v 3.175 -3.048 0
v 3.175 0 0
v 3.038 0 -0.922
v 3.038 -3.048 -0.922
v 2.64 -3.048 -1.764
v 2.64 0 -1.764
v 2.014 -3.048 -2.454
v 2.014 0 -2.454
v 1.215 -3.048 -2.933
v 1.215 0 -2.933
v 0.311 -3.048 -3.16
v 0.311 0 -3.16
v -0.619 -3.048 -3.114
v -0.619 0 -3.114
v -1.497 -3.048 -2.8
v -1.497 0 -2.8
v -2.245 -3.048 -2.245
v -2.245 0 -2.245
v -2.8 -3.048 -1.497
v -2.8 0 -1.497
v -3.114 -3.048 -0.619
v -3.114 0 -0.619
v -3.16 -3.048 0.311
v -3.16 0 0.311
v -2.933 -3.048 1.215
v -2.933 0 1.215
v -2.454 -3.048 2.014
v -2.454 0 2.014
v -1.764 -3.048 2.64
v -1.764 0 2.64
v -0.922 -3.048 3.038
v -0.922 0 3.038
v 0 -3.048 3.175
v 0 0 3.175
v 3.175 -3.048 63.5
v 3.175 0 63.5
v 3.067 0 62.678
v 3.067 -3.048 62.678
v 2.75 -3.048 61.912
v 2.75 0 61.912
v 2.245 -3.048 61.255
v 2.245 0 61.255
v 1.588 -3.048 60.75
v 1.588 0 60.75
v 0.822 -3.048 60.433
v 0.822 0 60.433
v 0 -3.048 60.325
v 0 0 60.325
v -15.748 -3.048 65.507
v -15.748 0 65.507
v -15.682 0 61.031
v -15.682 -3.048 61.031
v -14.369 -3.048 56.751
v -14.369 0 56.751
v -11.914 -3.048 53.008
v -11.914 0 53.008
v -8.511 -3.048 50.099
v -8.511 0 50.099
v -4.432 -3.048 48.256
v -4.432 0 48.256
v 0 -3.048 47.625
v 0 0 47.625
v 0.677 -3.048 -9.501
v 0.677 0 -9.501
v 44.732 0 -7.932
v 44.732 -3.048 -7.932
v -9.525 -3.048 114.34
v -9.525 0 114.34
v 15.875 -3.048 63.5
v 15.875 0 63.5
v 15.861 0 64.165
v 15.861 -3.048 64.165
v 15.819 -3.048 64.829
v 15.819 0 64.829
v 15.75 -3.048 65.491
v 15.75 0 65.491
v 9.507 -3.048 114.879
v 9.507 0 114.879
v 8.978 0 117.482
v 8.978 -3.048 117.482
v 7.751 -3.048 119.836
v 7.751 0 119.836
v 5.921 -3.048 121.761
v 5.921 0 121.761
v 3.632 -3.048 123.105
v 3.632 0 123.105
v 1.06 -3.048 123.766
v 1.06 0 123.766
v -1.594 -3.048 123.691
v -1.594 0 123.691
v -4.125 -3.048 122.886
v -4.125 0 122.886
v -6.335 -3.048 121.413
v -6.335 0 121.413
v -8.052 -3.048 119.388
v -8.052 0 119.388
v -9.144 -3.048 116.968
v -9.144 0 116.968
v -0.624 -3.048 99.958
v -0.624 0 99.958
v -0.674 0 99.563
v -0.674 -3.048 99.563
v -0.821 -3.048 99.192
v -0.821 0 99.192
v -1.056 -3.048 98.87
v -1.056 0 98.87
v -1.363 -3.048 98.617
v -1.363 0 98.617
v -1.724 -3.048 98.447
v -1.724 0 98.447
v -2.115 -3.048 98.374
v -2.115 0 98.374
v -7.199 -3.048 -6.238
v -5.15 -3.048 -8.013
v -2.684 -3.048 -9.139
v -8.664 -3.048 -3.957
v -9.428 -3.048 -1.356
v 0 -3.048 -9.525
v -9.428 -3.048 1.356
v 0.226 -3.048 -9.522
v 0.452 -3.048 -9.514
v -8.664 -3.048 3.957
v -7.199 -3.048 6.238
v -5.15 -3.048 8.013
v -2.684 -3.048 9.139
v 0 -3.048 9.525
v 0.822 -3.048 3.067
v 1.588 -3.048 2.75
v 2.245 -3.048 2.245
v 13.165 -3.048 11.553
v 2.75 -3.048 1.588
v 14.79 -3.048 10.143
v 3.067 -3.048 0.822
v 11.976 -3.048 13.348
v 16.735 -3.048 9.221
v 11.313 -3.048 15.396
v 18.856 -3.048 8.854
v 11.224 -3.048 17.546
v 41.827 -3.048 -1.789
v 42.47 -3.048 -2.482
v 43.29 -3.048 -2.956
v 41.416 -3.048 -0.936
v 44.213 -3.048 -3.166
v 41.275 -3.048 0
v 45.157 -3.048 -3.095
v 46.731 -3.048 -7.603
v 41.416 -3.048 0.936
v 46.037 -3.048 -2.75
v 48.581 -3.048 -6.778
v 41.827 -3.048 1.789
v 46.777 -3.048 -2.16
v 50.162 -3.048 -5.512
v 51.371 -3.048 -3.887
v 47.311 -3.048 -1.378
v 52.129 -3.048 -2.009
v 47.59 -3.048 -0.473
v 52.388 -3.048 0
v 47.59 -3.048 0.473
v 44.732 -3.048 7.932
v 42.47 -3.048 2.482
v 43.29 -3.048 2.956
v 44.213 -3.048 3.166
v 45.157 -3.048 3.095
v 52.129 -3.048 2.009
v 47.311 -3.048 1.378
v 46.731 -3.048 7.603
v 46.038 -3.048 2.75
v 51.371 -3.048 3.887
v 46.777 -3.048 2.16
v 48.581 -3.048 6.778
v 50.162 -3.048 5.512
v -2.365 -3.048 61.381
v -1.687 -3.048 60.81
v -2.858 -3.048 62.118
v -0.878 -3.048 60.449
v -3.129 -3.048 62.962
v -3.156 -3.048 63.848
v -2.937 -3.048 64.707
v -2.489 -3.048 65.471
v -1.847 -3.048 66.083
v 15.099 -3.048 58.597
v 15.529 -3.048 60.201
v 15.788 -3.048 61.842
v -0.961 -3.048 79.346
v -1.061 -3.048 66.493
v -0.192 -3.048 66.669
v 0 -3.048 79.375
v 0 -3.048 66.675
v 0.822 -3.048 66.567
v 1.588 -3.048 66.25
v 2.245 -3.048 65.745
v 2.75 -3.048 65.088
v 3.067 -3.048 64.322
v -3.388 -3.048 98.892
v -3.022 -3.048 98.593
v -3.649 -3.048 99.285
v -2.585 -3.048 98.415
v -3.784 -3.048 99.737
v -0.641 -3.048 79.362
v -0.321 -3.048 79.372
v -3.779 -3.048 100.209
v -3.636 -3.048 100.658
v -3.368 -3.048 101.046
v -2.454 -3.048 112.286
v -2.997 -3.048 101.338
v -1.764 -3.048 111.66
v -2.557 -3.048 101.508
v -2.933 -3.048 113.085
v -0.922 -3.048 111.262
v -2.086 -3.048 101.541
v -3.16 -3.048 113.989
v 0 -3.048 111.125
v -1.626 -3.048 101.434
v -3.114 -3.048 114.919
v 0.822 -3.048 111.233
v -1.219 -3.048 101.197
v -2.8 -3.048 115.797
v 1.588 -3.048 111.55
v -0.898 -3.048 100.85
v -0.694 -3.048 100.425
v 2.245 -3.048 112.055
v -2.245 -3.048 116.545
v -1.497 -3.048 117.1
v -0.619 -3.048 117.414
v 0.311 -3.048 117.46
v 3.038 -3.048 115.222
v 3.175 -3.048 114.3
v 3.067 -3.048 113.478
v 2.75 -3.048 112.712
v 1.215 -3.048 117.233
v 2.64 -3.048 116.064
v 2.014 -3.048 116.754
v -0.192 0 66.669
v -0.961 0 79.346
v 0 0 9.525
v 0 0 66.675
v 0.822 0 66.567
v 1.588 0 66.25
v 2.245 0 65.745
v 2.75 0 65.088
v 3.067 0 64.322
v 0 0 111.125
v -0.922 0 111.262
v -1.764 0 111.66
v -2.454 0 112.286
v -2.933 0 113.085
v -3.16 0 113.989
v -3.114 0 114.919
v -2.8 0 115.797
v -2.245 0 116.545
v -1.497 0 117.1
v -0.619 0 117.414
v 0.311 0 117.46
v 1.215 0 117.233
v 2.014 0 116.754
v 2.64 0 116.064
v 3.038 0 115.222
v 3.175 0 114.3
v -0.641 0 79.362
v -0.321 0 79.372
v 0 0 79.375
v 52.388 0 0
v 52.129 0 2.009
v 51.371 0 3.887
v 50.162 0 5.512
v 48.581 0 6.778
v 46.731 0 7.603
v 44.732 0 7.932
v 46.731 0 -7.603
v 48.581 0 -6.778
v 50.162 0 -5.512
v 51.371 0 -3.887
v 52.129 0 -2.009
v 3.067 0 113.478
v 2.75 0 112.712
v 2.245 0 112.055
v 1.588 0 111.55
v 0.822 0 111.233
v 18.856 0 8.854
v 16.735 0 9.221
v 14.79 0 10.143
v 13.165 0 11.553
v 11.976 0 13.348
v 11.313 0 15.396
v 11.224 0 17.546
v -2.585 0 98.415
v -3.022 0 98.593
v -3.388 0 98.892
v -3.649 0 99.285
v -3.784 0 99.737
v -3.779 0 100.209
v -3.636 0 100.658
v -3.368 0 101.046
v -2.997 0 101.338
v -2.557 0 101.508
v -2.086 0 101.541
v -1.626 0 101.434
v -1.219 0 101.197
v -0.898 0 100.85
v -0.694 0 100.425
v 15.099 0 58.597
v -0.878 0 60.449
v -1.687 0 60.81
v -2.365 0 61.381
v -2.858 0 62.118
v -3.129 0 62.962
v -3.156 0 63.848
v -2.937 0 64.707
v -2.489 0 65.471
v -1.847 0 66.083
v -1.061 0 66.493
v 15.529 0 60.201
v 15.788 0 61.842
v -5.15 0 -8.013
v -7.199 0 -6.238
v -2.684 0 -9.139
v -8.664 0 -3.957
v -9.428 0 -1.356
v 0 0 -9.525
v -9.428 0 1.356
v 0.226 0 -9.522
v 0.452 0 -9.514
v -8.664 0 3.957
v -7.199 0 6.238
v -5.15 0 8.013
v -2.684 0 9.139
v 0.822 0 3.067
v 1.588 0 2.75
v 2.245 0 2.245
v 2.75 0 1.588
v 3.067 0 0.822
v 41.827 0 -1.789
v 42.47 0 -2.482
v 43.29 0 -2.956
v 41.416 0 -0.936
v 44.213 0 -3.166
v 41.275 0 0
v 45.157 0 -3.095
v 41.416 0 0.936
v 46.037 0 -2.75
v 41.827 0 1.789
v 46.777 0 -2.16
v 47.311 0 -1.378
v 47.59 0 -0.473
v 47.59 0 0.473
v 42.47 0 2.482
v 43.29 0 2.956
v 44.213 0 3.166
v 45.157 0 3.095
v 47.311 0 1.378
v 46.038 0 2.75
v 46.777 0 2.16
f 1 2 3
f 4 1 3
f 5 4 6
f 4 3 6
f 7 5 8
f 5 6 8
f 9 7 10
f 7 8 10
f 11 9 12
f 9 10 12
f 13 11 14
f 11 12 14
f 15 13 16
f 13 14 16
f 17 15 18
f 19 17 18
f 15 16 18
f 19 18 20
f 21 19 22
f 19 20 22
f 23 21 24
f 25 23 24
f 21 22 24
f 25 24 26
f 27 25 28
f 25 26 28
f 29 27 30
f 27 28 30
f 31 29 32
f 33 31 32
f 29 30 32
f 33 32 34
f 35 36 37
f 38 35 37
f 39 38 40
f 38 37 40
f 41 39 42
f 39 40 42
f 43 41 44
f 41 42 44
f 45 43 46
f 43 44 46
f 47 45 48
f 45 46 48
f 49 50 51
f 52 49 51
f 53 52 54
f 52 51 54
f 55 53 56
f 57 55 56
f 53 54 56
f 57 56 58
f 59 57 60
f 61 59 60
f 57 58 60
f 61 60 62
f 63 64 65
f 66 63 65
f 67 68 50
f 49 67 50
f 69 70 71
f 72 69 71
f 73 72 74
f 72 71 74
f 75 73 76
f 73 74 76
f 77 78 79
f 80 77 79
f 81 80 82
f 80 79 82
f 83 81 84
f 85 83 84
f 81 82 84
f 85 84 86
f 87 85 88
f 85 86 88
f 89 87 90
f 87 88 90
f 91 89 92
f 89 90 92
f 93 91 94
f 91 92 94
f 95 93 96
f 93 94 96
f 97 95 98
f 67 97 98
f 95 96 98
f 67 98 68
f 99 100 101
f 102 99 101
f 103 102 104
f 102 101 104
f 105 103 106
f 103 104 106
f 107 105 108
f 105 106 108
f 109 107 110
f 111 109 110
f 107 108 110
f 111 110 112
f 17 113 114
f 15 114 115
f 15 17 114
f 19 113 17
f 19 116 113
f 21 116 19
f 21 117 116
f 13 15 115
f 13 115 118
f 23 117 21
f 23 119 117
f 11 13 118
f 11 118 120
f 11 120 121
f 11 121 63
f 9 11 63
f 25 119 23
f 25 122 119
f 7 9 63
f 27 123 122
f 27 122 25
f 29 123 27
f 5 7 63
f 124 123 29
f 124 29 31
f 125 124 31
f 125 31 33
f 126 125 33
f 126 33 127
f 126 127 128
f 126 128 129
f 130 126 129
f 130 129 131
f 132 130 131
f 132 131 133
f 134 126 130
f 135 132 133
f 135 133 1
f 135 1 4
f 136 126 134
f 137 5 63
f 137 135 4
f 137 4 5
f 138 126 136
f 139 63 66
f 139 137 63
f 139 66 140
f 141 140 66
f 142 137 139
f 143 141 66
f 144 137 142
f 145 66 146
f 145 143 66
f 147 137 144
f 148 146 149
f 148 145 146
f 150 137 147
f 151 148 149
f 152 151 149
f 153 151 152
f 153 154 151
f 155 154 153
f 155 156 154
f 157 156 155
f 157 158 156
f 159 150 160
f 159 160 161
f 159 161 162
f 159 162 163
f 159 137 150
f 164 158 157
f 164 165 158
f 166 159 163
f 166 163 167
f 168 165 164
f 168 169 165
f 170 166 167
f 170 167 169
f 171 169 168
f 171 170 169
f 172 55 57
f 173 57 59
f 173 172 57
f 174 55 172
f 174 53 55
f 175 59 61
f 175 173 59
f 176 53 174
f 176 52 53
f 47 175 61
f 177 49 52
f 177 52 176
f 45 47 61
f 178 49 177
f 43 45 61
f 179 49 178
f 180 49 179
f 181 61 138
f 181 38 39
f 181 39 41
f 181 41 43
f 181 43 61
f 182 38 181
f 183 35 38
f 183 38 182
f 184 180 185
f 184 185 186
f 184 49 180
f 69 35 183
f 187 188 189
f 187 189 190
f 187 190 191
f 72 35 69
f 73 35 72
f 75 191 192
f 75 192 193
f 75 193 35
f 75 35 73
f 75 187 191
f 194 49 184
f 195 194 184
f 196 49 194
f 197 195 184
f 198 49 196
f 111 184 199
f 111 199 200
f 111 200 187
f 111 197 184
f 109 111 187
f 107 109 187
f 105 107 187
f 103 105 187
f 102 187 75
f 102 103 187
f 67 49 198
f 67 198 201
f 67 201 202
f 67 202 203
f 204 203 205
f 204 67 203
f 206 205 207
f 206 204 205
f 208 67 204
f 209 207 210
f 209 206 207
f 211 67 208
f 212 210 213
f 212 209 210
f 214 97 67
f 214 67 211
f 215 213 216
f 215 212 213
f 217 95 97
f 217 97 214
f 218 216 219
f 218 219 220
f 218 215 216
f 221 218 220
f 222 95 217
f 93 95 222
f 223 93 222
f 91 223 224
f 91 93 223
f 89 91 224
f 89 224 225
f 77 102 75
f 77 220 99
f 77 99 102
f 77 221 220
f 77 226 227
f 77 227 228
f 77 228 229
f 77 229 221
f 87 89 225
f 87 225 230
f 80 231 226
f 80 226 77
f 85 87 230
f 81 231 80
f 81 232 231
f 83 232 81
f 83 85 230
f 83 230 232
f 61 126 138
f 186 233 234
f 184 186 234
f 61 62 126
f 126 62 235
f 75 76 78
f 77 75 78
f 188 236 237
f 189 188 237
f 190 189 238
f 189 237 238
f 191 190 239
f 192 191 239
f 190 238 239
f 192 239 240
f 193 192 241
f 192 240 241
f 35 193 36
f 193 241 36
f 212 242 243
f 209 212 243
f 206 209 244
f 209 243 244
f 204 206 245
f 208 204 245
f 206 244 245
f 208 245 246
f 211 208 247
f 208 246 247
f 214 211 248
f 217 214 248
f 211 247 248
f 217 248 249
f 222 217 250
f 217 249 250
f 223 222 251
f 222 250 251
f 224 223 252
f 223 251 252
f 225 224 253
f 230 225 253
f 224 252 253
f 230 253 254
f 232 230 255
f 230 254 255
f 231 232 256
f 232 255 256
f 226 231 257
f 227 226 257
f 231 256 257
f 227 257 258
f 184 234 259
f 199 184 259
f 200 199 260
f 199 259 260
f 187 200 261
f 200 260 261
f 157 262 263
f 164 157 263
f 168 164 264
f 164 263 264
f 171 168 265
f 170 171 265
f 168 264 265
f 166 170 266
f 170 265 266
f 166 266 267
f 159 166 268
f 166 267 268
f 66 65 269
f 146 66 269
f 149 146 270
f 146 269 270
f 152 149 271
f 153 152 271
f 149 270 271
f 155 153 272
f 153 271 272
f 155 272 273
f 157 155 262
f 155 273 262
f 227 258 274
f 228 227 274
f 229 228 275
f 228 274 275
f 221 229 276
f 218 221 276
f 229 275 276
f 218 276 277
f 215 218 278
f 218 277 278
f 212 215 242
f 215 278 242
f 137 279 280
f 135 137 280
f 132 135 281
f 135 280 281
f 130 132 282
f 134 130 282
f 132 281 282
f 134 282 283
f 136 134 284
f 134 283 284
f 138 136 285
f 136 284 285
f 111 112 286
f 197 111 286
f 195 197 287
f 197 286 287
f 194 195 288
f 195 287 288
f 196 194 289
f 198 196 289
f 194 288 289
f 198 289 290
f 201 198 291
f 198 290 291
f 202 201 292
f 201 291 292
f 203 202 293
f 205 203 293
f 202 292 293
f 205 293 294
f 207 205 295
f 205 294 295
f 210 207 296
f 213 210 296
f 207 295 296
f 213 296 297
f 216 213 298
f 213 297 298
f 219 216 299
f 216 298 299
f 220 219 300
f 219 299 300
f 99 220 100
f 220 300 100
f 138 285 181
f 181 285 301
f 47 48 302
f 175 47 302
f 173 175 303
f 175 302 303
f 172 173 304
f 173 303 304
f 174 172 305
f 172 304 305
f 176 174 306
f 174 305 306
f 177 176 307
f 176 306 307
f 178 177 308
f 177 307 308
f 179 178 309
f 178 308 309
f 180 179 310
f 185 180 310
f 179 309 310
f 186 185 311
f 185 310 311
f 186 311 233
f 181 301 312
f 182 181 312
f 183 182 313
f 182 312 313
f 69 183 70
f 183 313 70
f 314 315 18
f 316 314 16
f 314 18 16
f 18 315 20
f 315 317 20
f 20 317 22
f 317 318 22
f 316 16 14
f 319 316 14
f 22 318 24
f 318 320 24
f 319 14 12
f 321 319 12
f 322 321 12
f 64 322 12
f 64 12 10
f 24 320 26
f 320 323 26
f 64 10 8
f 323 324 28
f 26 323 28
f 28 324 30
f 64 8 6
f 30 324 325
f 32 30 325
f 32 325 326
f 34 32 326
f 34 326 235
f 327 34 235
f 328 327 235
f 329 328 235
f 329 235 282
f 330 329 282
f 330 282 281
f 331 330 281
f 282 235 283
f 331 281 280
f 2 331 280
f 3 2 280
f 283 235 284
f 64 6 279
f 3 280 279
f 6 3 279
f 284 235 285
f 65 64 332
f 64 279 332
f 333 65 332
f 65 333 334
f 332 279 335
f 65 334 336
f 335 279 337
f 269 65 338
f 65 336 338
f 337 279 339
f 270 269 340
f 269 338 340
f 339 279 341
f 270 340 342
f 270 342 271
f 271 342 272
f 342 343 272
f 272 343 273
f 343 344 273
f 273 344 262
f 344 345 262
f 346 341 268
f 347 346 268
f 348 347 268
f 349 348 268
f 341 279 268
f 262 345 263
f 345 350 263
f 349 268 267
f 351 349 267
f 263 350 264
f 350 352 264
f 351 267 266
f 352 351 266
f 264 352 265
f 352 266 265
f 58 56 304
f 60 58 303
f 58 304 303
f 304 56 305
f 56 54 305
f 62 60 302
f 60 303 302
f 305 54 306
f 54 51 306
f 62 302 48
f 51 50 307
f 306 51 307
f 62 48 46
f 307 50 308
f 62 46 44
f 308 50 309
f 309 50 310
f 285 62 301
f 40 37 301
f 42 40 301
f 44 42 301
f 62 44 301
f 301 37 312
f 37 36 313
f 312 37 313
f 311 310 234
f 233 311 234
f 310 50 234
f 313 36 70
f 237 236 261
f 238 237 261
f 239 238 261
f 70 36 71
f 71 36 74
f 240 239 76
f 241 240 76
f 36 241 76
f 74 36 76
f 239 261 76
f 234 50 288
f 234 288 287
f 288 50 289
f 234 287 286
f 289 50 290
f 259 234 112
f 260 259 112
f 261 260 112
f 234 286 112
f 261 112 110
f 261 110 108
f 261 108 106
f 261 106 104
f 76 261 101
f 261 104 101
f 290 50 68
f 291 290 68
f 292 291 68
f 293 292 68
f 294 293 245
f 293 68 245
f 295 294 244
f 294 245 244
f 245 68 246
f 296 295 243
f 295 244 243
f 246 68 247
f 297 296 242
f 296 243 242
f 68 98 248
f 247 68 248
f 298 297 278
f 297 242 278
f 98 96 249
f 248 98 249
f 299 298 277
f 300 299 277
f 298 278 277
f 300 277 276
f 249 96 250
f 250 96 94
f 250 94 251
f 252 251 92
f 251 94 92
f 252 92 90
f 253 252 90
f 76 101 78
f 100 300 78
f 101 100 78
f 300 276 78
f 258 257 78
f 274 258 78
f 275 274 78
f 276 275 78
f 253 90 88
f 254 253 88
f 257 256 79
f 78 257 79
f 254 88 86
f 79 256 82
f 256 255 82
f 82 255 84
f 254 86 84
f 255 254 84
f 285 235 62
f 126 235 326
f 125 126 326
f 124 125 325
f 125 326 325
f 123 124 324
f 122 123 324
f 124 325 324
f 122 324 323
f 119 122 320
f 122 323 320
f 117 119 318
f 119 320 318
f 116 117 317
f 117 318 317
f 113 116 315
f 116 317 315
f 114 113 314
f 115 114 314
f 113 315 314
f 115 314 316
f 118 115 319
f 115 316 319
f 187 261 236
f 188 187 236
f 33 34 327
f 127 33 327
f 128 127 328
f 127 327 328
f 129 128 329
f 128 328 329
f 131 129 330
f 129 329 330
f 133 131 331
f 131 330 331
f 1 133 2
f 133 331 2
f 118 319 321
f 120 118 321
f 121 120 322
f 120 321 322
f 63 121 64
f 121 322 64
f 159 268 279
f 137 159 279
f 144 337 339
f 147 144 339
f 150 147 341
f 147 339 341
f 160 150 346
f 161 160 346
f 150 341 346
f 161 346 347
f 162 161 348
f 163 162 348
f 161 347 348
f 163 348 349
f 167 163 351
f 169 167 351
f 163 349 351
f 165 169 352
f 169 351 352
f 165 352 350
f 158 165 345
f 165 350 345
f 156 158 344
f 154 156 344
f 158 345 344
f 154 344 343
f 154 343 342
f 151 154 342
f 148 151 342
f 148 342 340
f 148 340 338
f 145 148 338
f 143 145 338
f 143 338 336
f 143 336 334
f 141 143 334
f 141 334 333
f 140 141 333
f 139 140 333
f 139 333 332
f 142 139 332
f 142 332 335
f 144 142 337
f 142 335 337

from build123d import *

# Parameters (mm, degrees)
F1_DEPTH = 3.048


with BuildPart() as f1:
    # F0 (on Front) → F1 (new body)
    with BuildSketch(Plane.XZ):
        with BuildLine():
            ThreePointArc((15.0989586091, 58.5972381334), (15.6797894265, 61.0180998126), (15.875, 63.5))
            ThreePointArc((15.875, 63.5), (15.843643726, 64.4972855577), (15.7496987737, 65.4906314418))
            Line((15.7496987737, 65.4906314418), (15.0989586091, 58.5972381334))
        make_face()
        with BuildLine():
            Line((15.0989586091, 58.5972381334), (15.7496987737, 65.4906314418))
            ThreePointArc((15.7496987737, 65.4906314418), (10.4979605367, 75.408335298), (0, 79.375))
            Line((0, 79.375), (0, 66.675))
            ThreePointArc((0, 66.675), (2.2450640303, 65.7450640303), (3.175, 63.5))
            ThreePointArc((3.175, 63.5), (2.2450640303, 61.2549359697), (0, 60.325))
            Line((0, 60.325), (0, 47.625))
            ThreePointArc((0, 47.625), (9.3323169783, 50.6577461162), (15.0989586091, 58.5972381334))
        make_face()
        with BuildLine():
            ThreePointArc((0, 79.375), (10.4979605367, 75.408335298), (15.7496987737, 65.4906314418))
            Line((15.7496987737, 65.4906314418), (9.5073556067, 114.8794949239))
            ThreePointArc((9.5073556067, 114.8794949239), (9.5205878798, 114.5898817394), (9.525, 114.3))
            ThreePointArc((9.525, 114.3), (6.7351920908, 107.5648079092), (0, 104.775))
            Line((0, 104.775), (0, 79.375))
        make_face()
        with BuildLine():
            Line((11.2237043258, 17.546057651), (15.0989586091, 58.5972381334))
            ThreePointArc((15.0989586091, 58.5972381334), (9.3323169783, 50.6577461162), (0, 47.625))
            Line((0, 47.625), (0, 9.525))
            ThreePointArc((0, 9.525), (6.7351920908, 6.7351920908), (9.525, 0))
            Line((9.525, 0), (36.5125, 0))
            ThreePointArc((36.5125, 0), (38.9380895153, 5.7116327839), (44.7324052746, 7.9324746146))
            Line((44.7324052746, 7.9324746146), (18.8558582529, 8.853709629))
            ThreePointArc((18.8558582529, 8.853709629), (13.1645636219, 11.5533837704), (11.2237043258, 17.546057651))
        make_face()
        with BuildLine():
            ThreePointArc((-0.9612294652, 79.3458721096), (-0.4808353457, 79.3677163565), (0, 79.375))
            Line((0, 79.375), (0, 104.775))
            ThreePointArc((0, 104.775), (-6.7492648996, 107.5789101839), (-9.5249166577, 114.339845498))
            Line((-9.5249166577, 114.339845498), (-15.7476590945, 65.5067032771))
            ThreePointArc((-15.7476590945, 65.5067032771), (-10.8479208938, 75.0904373205), (-0.9612294652, 79.3458721096))
        make_face()
        with BuildLine():
            ThreePointArc((-0.6240967535, 99.9581825499), (-1.0555795763, 98.8701657595), (-2.1154738069, 98.3735953389))
            ThreePointArc((-2.1154738069, 98.3735953389), (-3.3676139306, 101.0461993403), (-0.6240967535, 99.9581825499))
        make_face(mode=Mode.SUBTRACT)
        with BuildLine():
            ThreePointArc((9.525, 114.3), (9.5205878798, 114.5898817394), (9.5073556067, 114.8794949239))
            ThreePointArc((9.5073556067, 114.8794949239), (-0.2699675413, 123.8211733797), (-9.5249166577, 114.339845498))
            ThreePointArc((-9.5249166577, 114.339845498), (-6.7492648996, 107.5789101839), (0, 104.775))
            ThreePointArc((0, 104.775), (6.7351920908, 107.5648079092), (9.525, 114.3))
        make_face()
        with BuildLine():
            ThreePointArc((3.175, 114.3), (2.2450640303, 112.0549359697), (0, 111.125))
            ThreePointArc((0, 111.125), (-2.2450640303, 116.5450640303), (3.175, 114.3))
        make_face(mode=Mode.SUBTRACT)
        with BuildLine():
            ThreePointArc((-15.0944695401, 58.5834347047), (-9.3264449534, 50.6534810345), (0, 47.625))
            Line((0, 47.625), (0, 60.325))
            ThreePointArc((0, 60.325), (-3.1735432713, 63.4038329309), (-0.192245893, 66.6691744219))
            Line((-0.192245893, 66.6691744219), (-0.9612294652, 79.3458721096))
            ThreePointArc((-0.9612294652, 79.3458721096), (-10.8479208938, 75.0904373205), (-15.7476590945, 65.5067032771))
            Line((-15.7476590945, 65.5067032771), (-15.0944695401, 58.5834347047))
        make_face()
        with BuildLine():
            ThreePointArc((-15.7476590945, 65.5067032771), (-15.8048137164, 62.00886339), (-15.0944695401, 58.5834347047))
            Line((-15.0944695401, 58.5834347047), (-15.7476590945, 65.5067032771))
        make_face()
        with BuildLine():
            ThreePointArc((9.525, 0), (6.7351920908, 6.7351920908), (0, 9.525))
            Line((0, 9.525), (0, 3.175))
            ThreePointArc((0, 3.175), (2.2450640303, 2.2450640303), (3.175, 0))
            Line((3.175, 0), (9.525, 0))
        make_face()
        with BuildLine():
            Line((0, 3.175), (0, 9.525))
            ThreePointArc((0, 9.525), (-9.525, 0), (0, -9.525))
            Line((0, -9.525), (0.6773435479, -9.500885786))
            ThreePointArc((0.6773435479, -9.500885786), (6.9705567315, -6.4912990883), (9.525, 0))
            Line((9.525, 0), (3.175, 0))
            ThreePointArc((3.175, 0), (-2.2450640303, -2.2450640303), (0, 3.175))
        make_face()
        with BuildLine():
            Line((36.5125, 0), (9.525, 0))
            ThreePointArc((9.525, 0), (6.9705567315, -6.4912990883), (0.6773435479, -9.500885786))
            Line((0.6773435479, -9.500885786), (44.7324052746, -7.9324746146))
            ThreePointArc((44.7324052746, -7.9324746146), (38.9380895153, -5.7116327839), (36.5125, 0))
        make_face()
        with BuildLine():
            Line((0.6773435479, -9.500885786), (0, -9.525))
            ThreePointArc((0, -9.525), (0.3388863295, -9.5189695375), (0.6773435479, -9.500885786))
        make_face()
        with BuildLine():
            ThreePointArc((52.3875, 0), (50.1616327839, 5.5119104847), (44.7324052746, 7.9324746146))
            ThreePointArc((44.7324052746, 7.9324746146), (38.9380895153, 5.7116327839), (36.5125, 0))
            ThreePointArc((36.5125, 0), (38.9380895153, -5.7116327839), (44.7324052746, -7.9324746146))
            ThreePointArc((44.7324052746, -7.9324746146), (50.1616327839, -5.5119104847), (52.3875, 0))
        make_face()
        with BuildLine():
            ThreePointArc((47.625, 0), (44.45, -3.175), (41.275, 0))
            ThreePointArc((41.275, 0), (44.45, 3.175), (47.625, 0))
        make_face(mode=Mode.SUBTRACT)
    extrude(amount=F1_DEPTH)


solid = f1.part
